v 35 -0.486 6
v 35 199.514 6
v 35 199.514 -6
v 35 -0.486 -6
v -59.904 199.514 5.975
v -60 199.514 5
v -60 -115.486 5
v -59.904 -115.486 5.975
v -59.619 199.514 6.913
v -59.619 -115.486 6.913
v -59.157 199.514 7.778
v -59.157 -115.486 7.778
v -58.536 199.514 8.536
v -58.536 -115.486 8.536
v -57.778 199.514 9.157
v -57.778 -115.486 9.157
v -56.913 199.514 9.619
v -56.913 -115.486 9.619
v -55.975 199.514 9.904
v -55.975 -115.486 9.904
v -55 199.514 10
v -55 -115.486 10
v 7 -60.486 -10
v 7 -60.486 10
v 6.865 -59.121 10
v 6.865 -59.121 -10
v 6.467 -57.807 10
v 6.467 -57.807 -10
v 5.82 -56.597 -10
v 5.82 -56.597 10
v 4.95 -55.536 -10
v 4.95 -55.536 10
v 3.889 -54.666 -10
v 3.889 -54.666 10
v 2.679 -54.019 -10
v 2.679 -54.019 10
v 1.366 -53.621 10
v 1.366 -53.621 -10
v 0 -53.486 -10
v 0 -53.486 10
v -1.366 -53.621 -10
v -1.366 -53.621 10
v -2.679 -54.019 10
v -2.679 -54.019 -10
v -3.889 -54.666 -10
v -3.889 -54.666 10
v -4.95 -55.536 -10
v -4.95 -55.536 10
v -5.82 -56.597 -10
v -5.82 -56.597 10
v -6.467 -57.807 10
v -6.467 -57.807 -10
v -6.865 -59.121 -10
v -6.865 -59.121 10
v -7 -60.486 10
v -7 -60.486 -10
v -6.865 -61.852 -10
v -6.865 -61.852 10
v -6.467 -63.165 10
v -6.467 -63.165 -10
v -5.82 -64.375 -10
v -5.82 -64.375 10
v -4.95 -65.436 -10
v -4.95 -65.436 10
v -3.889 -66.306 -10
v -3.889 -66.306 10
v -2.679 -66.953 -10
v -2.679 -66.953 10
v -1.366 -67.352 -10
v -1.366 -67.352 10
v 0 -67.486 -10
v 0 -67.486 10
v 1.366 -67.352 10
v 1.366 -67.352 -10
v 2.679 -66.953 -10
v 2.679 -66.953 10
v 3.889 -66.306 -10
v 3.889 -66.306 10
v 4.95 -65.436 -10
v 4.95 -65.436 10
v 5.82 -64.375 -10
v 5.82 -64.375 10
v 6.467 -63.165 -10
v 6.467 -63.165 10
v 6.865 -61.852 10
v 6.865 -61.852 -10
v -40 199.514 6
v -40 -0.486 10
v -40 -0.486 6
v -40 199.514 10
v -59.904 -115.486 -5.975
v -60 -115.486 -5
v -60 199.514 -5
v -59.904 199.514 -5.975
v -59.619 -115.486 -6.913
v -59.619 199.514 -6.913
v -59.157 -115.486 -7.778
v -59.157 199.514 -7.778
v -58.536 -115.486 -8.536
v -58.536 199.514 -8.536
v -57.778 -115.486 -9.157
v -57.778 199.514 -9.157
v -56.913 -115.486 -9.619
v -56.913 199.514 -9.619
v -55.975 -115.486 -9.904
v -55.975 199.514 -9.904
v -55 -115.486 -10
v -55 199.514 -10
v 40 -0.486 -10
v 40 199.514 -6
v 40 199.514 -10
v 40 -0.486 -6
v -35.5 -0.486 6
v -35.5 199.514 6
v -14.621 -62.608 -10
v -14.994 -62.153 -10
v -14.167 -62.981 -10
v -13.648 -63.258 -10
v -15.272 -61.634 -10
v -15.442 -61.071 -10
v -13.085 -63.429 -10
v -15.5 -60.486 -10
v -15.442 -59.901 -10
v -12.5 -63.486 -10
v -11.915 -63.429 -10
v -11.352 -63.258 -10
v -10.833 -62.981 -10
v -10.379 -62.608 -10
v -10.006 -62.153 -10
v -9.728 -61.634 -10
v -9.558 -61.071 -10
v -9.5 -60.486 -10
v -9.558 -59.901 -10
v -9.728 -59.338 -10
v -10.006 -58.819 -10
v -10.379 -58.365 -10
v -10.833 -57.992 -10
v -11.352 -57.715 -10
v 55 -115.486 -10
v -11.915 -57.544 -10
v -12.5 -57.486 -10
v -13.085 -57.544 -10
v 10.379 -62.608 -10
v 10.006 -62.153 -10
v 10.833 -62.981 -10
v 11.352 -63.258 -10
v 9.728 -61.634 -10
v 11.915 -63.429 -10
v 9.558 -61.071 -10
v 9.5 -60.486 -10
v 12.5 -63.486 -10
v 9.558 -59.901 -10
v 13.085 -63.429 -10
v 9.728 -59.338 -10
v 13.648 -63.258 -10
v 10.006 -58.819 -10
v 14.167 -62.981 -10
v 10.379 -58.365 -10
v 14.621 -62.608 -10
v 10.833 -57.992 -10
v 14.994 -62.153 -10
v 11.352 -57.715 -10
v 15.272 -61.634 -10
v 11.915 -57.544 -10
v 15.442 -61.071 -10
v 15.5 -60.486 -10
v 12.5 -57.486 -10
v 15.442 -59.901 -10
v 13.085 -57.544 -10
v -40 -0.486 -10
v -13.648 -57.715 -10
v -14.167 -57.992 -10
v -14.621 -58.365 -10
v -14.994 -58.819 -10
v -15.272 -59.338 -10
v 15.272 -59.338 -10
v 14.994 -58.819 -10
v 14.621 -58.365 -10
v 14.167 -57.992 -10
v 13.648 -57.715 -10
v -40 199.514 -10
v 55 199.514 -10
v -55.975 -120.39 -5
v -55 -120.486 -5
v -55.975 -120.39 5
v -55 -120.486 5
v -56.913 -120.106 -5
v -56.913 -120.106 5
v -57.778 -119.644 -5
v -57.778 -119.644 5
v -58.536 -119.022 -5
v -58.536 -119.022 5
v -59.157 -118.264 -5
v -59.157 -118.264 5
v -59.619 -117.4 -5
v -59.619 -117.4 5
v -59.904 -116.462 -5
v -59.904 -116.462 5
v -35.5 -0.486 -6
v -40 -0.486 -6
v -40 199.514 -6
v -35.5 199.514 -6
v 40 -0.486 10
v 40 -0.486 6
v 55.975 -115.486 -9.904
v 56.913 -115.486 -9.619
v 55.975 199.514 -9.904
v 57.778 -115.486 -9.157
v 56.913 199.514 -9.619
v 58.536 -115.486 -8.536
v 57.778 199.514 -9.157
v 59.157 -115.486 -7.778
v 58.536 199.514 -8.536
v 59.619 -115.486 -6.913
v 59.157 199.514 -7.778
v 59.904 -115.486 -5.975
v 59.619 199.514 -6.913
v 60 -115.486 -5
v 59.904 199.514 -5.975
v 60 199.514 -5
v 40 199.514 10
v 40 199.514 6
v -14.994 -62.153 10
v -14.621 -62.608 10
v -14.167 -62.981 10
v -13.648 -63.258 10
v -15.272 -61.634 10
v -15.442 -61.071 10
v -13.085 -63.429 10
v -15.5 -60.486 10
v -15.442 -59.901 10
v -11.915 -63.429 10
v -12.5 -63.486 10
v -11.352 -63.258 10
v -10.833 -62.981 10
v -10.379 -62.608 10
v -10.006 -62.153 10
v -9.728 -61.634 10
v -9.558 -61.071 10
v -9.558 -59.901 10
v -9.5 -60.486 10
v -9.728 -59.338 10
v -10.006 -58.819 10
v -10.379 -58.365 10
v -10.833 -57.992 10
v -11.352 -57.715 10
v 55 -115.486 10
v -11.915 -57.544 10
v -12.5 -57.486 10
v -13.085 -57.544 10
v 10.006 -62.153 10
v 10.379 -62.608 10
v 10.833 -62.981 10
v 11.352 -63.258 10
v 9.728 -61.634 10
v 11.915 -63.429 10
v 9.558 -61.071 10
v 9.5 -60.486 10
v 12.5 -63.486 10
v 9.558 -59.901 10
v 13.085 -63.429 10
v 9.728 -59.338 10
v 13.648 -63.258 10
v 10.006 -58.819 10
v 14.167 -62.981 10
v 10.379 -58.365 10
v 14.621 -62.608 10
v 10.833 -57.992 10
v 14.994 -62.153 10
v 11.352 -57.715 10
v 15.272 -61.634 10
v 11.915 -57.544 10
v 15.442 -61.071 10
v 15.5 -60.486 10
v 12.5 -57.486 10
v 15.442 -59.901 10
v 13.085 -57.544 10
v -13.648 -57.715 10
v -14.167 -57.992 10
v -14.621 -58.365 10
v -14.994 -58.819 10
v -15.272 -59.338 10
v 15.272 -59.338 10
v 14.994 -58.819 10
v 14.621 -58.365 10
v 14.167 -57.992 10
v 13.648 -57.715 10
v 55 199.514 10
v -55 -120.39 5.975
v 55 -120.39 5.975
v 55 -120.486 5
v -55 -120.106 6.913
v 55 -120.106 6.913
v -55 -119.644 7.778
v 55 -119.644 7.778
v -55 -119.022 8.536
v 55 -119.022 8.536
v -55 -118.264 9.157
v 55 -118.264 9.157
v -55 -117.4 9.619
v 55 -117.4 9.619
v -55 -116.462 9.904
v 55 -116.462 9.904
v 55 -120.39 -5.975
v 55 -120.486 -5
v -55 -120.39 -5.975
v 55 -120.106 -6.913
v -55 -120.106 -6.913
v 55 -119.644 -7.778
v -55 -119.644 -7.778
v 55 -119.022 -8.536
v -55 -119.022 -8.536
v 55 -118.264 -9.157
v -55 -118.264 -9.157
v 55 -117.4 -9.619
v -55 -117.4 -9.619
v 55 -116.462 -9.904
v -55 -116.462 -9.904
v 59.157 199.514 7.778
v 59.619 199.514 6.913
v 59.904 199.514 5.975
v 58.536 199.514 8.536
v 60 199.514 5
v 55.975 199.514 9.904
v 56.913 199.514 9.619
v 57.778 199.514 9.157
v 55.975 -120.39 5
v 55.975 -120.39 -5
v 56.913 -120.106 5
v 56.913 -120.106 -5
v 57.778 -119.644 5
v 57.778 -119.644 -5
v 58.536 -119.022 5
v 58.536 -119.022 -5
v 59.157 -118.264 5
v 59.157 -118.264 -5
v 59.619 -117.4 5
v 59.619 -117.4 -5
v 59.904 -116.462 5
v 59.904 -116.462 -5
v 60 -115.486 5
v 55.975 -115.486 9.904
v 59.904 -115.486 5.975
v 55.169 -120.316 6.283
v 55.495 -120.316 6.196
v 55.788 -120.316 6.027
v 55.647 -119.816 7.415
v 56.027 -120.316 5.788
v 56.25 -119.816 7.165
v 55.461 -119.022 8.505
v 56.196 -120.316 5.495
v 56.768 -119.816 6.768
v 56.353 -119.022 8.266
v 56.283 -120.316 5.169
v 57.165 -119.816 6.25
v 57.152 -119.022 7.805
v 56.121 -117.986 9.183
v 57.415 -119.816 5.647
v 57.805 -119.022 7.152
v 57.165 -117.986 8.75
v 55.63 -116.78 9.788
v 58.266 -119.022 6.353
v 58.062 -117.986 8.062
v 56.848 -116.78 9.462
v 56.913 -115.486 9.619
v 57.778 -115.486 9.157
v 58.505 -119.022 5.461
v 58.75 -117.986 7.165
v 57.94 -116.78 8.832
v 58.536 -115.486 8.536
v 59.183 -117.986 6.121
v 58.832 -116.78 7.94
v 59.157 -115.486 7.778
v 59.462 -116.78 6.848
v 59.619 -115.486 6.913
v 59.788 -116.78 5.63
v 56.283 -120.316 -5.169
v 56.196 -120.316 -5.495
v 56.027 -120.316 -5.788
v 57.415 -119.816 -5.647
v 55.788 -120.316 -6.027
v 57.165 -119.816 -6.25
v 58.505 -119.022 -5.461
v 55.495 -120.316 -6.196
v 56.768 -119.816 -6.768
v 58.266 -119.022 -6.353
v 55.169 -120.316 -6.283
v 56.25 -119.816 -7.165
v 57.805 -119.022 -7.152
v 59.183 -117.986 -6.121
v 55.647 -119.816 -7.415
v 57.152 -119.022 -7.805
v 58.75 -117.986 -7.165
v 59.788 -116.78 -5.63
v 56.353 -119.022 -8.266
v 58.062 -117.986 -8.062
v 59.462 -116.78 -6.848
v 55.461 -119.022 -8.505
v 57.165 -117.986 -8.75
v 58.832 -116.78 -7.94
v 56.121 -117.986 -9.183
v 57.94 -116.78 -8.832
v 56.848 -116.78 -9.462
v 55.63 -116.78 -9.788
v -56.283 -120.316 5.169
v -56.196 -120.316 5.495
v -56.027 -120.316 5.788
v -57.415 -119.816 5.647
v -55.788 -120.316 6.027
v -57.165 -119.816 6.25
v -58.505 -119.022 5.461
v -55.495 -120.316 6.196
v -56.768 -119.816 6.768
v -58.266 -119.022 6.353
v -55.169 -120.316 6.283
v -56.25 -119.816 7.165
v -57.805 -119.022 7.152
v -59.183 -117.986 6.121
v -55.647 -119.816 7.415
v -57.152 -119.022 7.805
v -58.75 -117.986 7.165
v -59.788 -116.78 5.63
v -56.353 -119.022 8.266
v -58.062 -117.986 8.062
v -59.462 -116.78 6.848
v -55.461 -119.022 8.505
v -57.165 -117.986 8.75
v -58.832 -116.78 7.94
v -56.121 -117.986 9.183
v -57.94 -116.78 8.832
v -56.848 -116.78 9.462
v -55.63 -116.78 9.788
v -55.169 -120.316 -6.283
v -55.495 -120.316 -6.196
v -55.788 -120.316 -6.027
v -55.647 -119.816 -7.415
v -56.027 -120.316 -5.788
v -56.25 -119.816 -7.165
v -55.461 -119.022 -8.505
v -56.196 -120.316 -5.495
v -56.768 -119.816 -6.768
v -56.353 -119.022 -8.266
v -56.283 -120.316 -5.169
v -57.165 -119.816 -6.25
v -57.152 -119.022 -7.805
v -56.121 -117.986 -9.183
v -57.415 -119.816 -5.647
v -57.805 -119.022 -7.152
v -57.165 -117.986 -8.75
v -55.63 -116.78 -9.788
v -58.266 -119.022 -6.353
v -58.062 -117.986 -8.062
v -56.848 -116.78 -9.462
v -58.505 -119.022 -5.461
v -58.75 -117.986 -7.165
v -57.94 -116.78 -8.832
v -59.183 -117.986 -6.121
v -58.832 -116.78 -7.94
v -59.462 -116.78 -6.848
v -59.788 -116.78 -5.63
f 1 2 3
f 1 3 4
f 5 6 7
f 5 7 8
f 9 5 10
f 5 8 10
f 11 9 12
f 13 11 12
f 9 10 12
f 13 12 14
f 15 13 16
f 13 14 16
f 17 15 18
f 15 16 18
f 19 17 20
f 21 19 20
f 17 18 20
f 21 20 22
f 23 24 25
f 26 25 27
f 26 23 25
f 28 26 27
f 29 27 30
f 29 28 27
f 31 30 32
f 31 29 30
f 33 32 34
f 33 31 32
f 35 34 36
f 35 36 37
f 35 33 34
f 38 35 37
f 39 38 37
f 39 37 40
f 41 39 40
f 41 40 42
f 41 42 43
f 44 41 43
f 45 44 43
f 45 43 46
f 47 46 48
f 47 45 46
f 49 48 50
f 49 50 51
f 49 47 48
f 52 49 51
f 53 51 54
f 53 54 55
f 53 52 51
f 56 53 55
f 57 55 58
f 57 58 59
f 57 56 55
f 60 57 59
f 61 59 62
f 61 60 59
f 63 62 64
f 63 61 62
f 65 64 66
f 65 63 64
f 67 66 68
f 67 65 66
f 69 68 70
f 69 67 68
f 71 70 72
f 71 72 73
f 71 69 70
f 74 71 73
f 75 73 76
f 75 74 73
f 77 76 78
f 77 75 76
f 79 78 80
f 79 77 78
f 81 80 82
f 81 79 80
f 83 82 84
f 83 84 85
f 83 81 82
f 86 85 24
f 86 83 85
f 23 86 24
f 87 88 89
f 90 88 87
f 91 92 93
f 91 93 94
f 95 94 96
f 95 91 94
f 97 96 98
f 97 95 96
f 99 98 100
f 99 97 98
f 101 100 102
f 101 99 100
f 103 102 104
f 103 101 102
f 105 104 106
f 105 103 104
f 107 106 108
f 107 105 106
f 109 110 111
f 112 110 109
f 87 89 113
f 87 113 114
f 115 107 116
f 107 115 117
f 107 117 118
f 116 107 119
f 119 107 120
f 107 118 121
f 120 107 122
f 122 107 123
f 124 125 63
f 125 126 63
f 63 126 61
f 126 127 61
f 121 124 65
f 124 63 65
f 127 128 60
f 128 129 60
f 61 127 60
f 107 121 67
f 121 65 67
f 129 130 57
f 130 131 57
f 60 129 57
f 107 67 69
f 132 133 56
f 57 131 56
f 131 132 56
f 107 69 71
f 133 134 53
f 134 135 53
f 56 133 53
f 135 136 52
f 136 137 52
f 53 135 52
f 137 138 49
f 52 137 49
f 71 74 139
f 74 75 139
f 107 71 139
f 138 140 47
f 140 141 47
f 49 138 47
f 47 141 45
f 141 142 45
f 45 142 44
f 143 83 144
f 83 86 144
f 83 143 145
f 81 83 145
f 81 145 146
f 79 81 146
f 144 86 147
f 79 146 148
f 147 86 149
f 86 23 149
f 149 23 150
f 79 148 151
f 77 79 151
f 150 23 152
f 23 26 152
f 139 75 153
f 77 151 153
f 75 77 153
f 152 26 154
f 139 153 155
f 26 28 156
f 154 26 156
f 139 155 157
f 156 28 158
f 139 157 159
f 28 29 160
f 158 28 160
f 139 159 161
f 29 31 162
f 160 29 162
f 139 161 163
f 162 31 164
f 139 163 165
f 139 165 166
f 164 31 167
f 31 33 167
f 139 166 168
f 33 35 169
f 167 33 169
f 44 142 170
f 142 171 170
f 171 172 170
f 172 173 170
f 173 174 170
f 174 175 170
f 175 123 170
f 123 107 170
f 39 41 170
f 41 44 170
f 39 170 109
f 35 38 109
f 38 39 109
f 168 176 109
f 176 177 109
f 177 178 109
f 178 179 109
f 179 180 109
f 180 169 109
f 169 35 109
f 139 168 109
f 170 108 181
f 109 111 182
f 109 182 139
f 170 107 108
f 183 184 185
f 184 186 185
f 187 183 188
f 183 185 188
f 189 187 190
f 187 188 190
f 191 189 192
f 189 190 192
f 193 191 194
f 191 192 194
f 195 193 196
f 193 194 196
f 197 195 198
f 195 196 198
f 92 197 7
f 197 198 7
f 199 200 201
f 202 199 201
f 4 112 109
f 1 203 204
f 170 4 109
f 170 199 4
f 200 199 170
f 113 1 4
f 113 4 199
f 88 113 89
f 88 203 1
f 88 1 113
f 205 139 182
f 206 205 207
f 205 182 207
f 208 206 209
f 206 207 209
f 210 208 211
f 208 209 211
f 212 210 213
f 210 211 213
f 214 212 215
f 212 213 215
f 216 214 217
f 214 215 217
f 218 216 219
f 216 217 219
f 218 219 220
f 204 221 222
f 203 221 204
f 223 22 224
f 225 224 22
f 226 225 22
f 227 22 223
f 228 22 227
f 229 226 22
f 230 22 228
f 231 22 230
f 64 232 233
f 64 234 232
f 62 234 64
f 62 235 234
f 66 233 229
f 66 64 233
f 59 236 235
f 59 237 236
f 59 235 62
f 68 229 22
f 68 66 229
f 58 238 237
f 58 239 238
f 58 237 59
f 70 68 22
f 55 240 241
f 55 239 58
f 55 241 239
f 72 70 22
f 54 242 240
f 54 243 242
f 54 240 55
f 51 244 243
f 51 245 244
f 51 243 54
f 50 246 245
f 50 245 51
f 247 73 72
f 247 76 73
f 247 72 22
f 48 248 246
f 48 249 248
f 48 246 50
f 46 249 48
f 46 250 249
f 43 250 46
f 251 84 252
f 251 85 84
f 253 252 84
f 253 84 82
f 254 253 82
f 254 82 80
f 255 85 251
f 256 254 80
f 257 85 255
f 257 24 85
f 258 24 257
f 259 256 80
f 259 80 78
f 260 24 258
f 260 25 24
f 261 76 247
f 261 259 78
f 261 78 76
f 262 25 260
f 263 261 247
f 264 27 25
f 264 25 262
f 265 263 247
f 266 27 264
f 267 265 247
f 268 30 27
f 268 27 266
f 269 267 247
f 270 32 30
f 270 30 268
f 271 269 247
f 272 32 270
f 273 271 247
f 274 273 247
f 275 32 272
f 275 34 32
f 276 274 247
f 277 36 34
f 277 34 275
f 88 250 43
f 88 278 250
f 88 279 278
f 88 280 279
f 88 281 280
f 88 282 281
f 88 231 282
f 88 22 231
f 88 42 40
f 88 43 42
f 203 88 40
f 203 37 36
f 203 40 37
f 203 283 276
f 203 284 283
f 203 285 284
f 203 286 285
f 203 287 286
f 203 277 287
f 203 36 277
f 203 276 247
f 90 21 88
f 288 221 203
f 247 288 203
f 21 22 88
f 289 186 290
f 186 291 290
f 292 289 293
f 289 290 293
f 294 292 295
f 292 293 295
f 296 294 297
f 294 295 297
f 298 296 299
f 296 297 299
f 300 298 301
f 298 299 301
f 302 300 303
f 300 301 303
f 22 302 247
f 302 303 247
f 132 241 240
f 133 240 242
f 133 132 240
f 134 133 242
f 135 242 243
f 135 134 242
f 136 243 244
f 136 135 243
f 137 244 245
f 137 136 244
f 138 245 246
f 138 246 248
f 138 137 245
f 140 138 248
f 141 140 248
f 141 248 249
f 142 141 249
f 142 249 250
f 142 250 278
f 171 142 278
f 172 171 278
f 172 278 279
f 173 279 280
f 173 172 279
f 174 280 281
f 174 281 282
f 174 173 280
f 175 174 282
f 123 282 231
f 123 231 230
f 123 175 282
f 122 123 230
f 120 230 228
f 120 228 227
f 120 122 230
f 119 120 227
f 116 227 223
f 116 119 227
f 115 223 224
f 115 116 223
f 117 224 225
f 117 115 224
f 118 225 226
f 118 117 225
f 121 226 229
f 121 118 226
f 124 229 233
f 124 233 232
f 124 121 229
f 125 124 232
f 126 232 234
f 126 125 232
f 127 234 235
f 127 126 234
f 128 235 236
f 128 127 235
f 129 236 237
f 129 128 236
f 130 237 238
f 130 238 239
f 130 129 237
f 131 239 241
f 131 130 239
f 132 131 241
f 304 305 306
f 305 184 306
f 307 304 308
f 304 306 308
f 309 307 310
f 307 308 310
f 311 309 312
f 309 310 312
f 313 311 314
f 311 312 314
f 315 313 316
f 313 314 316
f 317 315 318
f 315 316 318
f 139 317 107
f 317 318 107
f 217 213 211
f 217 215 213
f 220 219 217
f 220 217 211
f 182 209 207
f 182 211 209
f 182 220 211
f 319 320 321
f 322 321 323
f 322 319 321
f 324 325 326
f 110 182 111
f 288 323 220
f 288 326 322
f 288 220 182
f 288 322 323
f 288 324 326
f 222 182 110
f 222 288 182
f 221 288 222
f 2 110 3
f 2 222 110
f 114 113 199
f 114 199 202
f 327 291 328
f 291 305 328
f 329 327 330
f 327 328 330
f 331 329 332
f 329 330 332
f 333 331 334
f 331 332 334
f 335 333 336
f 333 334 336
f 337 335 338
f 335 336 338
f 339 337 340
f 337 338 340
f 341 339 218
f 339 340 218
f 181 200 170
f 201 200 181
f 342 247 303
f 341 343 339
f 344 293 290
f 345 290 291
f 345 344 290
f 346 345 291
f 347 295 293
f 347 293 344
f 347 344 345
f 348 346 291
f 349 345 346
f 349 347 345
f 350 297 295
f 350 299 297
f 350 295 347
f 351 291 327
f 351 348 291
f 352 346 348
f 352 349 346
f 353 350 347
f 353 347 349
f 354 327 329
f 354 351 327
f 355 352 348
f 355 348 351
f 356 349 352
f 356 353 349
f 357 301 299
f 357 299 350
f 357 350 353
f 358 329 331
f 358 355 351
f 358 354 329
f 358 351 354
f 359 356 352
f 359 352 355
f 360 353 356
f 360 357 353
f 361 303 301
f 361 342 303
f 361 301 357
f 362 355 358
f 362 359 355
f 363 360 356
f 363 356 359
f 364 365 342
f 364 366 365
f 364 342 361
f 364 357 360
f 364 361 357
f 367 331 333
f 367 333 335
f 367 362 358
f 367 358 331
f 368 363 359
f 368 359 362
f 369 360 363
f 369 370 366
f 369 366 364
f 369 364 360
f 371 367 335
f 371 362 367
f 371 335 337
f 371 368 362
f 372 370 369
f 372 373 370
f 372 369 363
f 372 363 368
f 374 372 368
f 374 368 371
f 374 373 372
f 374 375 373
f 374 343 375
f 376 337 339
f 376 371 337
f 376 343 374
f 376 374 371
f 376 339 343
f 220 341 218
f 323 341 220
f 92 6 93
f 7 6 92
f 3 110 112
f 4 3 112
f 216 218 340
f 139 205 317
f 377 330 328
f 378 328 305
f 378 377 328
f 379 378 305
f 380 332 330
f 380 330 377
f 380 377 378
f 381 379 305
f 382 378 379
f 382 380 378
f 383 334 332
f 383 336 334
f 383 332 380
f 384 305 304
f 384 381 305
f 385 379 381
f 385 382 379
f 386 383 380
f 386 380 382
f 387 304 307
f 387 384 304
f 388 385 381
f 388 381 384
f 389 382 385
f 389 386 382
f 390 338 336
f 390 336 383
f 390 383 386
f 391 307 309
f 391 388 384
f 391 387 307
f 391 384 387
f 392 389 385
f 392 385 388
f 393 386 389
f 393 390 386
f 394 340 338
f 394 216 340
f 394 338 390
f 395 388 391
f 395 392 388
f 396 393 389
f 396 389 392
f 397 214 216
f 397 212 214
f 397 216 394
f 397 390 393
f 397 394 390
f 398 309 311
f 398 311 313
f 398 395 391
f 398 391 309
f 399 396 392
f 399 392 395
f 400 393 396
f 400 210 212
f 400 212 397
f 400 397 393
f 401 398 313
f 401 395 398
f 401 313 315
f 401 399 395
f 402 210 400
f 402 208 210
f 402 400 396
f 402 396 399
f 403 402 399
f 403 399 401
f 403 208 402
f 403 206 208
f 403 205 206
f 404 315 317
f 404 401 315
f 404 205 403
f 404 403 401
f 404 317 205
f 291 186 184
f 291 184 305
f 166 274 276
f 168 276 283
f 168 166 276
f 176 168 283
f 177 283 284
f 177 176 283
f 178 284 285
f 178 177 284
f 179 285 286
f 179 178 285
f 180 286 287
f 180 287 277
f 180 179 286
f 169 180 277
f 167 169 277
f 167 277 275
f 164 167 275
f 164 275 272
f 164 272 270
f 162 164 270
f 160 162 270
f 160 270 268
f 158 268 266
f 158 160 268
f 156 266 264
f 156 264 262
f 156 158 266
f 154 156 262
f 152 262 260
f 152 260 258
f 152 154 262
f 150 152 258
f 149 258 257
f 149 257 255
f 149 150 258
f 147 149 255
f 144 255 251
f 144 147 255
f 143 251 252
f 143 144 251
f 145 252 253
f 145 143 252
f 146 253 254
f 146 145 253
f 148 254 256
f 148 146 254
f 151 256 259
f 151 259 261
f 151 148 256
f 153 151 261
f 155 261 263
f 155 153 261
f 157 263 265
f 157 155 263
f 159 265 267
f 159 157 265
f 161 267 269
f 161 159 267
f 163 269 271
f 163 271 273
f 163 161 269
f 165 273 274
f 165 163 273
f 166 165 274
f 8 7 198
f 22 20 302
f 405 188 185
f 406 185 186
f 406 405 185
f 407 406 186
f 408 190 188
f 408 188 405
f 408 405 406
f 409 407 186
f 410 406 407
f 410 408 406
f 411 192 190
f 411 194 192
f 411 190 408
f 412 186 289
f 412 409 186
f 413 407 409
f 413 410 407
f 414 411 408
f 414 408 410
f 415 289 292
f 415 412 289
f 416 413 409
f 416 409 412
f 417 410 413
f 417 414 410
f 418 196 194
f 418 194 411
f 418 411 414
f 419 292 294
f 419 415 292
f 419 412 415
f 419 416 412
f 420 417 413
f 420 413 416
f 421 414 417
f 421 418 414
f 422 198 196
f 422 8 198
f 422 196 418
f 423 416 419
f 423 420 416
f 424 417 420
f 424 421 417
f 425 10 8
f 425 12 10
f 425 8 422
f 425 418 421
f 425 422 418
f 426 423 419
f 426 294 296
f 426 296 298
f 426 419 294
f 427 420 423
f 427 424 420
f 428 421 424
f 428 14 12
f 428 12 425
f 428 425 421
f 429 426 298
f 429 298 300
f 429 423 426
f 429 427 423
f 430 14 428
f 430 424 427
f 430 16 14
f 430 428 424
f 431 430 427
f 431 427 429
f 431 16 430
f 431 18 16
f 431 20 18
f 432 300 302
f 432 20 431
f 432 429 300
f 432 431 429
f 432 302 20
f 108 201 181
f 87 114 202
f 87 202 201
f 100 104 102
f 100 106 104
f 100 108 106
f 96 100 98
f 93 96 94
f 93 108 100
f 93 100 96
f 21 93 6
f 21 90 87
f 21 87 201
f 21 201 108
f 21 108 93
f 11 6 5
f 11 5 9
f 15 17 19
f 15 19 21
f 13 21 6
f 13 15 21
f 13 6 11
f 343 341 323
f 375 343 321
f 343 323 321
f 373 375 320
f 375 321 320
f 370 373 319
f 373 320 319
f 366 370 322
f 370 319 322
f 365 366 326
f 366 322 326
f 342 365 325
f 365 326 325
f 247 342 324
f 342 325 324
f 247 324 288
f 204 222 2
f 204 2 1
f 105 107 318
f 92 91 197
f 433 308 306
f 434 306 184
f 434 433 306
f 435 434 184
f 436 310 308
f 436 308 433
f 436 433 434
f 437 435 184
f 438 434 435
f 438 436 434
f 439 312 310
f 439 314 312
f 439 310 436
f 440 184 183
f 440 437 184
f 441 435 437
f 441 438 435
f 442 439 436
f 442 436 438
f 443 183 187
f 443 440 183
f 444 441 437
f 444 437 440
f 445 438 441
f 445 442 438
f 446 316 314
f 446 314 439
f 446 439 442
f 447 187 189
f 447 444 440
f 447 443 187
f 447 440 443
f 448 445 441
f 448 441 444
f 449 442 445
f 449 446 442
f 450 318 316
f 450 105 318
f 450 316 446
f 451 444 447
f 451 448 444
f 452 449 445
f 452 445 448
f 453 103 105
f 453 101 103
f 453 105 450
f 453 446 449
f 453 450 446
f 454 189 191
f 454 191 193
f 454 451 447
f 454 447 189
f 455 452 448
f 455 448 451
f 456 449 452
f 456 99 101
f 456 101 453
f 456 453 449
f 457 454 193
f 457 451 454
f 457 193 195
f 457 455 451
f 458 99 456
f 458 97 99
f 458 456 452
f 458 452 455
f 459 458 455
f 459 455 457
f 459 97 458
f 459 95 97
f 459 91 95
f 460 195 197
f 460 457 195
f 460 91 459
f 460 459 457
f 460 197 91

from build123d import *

# Parameters (mm, degrees)
F0_R     = 3
F0_R_2   = 7
F1_DEPTH = 10
F2_W     = 200
F2_H     = 12
F3_DEPTH = 4.5
F4_W     = 200
F4_H     = 12
F5_DEPTH = 5
F6_R     = 5
F7_R     = 5
F8_R     = 5
F9_R     = 5
F10_R    = 5


with BuildPart() as f1:
    # F0 (on Top) → F1 (new body, symmetric)
    with BuildSketch(Plane.XY):
        Polygon((-40, 199.513814), (-60, 199.513814), (-60, -120.486186), (60, -120.486186), (60, 199.513814), (40, 199.513814), (40, -0.486186), (-40, -0.486186), align=None)
        with Locations((-12.5, -60.486186)):
            Circle(F0_R, mode=Mode.SUBTRACT)
        with Locations((0, -60.486186)):
            Circle(F0_R_2, mode=Mode.SUBTRACT)
        with Locations((12.5, -60.486186)):
            Circle(F0_R, mode=Mode.SUBTRACT)
    extrude(amount=F1_DEPTH, both=True)

    # F2 (on face) → F3 (join)
    with BuildSketch(Plane.YZ.offset(-40)):
        with Locations((99.513814, 0)):
            Rectangle(F2_W, F2_H)
    extrude(amount=F3_DEPTH)

    # F4 (on face) → F5 (join)
    with BuildSketch(Plane(origin=(40, 0, 0), x_dir=(0, -1, 0), z_dir=(-1, 0, 0))):
        with Locations((-99.513814, 0)):
            Rectangle(F4_W, F4_H)
    extrude(amount=F5_DEPTH)

    # F6
    f6_edges = [f1.edges().sort_by_distance(p)[0] for p in [
        (-60, 39.513814, 10),
    ]]
    fillet(f6_edges, radius=F6_R)

    # F7
    f7_edges = [f1.edges().sort_by_distance(p)[0] for p in [
        (-60, 39.513814, -10),
    ]]
    fillet(f7_edges, radius=F7_R)

    # F8
    f8_edges = [f1.edges().sort_by_distance(p)[0] for p in [
        (60, 39.513814, -10),
    ]]
    fillet(f8_edges, radius=F8_R)

    # F9
    f9_edges = [f1.edges().sort_by_distance(p)[0] for p in [
        (60, 39.513814, 10),
    ]]
    fillet(f9_edges, radius=F9_R)

    # F10
    f10_edges = [f1.edges().sort_by_distance(p)[0] for p in [
        (0, -120.486186, 10),
    ]]
    fillet(f10_edges, radius=F10_R)


solid = f1.part
